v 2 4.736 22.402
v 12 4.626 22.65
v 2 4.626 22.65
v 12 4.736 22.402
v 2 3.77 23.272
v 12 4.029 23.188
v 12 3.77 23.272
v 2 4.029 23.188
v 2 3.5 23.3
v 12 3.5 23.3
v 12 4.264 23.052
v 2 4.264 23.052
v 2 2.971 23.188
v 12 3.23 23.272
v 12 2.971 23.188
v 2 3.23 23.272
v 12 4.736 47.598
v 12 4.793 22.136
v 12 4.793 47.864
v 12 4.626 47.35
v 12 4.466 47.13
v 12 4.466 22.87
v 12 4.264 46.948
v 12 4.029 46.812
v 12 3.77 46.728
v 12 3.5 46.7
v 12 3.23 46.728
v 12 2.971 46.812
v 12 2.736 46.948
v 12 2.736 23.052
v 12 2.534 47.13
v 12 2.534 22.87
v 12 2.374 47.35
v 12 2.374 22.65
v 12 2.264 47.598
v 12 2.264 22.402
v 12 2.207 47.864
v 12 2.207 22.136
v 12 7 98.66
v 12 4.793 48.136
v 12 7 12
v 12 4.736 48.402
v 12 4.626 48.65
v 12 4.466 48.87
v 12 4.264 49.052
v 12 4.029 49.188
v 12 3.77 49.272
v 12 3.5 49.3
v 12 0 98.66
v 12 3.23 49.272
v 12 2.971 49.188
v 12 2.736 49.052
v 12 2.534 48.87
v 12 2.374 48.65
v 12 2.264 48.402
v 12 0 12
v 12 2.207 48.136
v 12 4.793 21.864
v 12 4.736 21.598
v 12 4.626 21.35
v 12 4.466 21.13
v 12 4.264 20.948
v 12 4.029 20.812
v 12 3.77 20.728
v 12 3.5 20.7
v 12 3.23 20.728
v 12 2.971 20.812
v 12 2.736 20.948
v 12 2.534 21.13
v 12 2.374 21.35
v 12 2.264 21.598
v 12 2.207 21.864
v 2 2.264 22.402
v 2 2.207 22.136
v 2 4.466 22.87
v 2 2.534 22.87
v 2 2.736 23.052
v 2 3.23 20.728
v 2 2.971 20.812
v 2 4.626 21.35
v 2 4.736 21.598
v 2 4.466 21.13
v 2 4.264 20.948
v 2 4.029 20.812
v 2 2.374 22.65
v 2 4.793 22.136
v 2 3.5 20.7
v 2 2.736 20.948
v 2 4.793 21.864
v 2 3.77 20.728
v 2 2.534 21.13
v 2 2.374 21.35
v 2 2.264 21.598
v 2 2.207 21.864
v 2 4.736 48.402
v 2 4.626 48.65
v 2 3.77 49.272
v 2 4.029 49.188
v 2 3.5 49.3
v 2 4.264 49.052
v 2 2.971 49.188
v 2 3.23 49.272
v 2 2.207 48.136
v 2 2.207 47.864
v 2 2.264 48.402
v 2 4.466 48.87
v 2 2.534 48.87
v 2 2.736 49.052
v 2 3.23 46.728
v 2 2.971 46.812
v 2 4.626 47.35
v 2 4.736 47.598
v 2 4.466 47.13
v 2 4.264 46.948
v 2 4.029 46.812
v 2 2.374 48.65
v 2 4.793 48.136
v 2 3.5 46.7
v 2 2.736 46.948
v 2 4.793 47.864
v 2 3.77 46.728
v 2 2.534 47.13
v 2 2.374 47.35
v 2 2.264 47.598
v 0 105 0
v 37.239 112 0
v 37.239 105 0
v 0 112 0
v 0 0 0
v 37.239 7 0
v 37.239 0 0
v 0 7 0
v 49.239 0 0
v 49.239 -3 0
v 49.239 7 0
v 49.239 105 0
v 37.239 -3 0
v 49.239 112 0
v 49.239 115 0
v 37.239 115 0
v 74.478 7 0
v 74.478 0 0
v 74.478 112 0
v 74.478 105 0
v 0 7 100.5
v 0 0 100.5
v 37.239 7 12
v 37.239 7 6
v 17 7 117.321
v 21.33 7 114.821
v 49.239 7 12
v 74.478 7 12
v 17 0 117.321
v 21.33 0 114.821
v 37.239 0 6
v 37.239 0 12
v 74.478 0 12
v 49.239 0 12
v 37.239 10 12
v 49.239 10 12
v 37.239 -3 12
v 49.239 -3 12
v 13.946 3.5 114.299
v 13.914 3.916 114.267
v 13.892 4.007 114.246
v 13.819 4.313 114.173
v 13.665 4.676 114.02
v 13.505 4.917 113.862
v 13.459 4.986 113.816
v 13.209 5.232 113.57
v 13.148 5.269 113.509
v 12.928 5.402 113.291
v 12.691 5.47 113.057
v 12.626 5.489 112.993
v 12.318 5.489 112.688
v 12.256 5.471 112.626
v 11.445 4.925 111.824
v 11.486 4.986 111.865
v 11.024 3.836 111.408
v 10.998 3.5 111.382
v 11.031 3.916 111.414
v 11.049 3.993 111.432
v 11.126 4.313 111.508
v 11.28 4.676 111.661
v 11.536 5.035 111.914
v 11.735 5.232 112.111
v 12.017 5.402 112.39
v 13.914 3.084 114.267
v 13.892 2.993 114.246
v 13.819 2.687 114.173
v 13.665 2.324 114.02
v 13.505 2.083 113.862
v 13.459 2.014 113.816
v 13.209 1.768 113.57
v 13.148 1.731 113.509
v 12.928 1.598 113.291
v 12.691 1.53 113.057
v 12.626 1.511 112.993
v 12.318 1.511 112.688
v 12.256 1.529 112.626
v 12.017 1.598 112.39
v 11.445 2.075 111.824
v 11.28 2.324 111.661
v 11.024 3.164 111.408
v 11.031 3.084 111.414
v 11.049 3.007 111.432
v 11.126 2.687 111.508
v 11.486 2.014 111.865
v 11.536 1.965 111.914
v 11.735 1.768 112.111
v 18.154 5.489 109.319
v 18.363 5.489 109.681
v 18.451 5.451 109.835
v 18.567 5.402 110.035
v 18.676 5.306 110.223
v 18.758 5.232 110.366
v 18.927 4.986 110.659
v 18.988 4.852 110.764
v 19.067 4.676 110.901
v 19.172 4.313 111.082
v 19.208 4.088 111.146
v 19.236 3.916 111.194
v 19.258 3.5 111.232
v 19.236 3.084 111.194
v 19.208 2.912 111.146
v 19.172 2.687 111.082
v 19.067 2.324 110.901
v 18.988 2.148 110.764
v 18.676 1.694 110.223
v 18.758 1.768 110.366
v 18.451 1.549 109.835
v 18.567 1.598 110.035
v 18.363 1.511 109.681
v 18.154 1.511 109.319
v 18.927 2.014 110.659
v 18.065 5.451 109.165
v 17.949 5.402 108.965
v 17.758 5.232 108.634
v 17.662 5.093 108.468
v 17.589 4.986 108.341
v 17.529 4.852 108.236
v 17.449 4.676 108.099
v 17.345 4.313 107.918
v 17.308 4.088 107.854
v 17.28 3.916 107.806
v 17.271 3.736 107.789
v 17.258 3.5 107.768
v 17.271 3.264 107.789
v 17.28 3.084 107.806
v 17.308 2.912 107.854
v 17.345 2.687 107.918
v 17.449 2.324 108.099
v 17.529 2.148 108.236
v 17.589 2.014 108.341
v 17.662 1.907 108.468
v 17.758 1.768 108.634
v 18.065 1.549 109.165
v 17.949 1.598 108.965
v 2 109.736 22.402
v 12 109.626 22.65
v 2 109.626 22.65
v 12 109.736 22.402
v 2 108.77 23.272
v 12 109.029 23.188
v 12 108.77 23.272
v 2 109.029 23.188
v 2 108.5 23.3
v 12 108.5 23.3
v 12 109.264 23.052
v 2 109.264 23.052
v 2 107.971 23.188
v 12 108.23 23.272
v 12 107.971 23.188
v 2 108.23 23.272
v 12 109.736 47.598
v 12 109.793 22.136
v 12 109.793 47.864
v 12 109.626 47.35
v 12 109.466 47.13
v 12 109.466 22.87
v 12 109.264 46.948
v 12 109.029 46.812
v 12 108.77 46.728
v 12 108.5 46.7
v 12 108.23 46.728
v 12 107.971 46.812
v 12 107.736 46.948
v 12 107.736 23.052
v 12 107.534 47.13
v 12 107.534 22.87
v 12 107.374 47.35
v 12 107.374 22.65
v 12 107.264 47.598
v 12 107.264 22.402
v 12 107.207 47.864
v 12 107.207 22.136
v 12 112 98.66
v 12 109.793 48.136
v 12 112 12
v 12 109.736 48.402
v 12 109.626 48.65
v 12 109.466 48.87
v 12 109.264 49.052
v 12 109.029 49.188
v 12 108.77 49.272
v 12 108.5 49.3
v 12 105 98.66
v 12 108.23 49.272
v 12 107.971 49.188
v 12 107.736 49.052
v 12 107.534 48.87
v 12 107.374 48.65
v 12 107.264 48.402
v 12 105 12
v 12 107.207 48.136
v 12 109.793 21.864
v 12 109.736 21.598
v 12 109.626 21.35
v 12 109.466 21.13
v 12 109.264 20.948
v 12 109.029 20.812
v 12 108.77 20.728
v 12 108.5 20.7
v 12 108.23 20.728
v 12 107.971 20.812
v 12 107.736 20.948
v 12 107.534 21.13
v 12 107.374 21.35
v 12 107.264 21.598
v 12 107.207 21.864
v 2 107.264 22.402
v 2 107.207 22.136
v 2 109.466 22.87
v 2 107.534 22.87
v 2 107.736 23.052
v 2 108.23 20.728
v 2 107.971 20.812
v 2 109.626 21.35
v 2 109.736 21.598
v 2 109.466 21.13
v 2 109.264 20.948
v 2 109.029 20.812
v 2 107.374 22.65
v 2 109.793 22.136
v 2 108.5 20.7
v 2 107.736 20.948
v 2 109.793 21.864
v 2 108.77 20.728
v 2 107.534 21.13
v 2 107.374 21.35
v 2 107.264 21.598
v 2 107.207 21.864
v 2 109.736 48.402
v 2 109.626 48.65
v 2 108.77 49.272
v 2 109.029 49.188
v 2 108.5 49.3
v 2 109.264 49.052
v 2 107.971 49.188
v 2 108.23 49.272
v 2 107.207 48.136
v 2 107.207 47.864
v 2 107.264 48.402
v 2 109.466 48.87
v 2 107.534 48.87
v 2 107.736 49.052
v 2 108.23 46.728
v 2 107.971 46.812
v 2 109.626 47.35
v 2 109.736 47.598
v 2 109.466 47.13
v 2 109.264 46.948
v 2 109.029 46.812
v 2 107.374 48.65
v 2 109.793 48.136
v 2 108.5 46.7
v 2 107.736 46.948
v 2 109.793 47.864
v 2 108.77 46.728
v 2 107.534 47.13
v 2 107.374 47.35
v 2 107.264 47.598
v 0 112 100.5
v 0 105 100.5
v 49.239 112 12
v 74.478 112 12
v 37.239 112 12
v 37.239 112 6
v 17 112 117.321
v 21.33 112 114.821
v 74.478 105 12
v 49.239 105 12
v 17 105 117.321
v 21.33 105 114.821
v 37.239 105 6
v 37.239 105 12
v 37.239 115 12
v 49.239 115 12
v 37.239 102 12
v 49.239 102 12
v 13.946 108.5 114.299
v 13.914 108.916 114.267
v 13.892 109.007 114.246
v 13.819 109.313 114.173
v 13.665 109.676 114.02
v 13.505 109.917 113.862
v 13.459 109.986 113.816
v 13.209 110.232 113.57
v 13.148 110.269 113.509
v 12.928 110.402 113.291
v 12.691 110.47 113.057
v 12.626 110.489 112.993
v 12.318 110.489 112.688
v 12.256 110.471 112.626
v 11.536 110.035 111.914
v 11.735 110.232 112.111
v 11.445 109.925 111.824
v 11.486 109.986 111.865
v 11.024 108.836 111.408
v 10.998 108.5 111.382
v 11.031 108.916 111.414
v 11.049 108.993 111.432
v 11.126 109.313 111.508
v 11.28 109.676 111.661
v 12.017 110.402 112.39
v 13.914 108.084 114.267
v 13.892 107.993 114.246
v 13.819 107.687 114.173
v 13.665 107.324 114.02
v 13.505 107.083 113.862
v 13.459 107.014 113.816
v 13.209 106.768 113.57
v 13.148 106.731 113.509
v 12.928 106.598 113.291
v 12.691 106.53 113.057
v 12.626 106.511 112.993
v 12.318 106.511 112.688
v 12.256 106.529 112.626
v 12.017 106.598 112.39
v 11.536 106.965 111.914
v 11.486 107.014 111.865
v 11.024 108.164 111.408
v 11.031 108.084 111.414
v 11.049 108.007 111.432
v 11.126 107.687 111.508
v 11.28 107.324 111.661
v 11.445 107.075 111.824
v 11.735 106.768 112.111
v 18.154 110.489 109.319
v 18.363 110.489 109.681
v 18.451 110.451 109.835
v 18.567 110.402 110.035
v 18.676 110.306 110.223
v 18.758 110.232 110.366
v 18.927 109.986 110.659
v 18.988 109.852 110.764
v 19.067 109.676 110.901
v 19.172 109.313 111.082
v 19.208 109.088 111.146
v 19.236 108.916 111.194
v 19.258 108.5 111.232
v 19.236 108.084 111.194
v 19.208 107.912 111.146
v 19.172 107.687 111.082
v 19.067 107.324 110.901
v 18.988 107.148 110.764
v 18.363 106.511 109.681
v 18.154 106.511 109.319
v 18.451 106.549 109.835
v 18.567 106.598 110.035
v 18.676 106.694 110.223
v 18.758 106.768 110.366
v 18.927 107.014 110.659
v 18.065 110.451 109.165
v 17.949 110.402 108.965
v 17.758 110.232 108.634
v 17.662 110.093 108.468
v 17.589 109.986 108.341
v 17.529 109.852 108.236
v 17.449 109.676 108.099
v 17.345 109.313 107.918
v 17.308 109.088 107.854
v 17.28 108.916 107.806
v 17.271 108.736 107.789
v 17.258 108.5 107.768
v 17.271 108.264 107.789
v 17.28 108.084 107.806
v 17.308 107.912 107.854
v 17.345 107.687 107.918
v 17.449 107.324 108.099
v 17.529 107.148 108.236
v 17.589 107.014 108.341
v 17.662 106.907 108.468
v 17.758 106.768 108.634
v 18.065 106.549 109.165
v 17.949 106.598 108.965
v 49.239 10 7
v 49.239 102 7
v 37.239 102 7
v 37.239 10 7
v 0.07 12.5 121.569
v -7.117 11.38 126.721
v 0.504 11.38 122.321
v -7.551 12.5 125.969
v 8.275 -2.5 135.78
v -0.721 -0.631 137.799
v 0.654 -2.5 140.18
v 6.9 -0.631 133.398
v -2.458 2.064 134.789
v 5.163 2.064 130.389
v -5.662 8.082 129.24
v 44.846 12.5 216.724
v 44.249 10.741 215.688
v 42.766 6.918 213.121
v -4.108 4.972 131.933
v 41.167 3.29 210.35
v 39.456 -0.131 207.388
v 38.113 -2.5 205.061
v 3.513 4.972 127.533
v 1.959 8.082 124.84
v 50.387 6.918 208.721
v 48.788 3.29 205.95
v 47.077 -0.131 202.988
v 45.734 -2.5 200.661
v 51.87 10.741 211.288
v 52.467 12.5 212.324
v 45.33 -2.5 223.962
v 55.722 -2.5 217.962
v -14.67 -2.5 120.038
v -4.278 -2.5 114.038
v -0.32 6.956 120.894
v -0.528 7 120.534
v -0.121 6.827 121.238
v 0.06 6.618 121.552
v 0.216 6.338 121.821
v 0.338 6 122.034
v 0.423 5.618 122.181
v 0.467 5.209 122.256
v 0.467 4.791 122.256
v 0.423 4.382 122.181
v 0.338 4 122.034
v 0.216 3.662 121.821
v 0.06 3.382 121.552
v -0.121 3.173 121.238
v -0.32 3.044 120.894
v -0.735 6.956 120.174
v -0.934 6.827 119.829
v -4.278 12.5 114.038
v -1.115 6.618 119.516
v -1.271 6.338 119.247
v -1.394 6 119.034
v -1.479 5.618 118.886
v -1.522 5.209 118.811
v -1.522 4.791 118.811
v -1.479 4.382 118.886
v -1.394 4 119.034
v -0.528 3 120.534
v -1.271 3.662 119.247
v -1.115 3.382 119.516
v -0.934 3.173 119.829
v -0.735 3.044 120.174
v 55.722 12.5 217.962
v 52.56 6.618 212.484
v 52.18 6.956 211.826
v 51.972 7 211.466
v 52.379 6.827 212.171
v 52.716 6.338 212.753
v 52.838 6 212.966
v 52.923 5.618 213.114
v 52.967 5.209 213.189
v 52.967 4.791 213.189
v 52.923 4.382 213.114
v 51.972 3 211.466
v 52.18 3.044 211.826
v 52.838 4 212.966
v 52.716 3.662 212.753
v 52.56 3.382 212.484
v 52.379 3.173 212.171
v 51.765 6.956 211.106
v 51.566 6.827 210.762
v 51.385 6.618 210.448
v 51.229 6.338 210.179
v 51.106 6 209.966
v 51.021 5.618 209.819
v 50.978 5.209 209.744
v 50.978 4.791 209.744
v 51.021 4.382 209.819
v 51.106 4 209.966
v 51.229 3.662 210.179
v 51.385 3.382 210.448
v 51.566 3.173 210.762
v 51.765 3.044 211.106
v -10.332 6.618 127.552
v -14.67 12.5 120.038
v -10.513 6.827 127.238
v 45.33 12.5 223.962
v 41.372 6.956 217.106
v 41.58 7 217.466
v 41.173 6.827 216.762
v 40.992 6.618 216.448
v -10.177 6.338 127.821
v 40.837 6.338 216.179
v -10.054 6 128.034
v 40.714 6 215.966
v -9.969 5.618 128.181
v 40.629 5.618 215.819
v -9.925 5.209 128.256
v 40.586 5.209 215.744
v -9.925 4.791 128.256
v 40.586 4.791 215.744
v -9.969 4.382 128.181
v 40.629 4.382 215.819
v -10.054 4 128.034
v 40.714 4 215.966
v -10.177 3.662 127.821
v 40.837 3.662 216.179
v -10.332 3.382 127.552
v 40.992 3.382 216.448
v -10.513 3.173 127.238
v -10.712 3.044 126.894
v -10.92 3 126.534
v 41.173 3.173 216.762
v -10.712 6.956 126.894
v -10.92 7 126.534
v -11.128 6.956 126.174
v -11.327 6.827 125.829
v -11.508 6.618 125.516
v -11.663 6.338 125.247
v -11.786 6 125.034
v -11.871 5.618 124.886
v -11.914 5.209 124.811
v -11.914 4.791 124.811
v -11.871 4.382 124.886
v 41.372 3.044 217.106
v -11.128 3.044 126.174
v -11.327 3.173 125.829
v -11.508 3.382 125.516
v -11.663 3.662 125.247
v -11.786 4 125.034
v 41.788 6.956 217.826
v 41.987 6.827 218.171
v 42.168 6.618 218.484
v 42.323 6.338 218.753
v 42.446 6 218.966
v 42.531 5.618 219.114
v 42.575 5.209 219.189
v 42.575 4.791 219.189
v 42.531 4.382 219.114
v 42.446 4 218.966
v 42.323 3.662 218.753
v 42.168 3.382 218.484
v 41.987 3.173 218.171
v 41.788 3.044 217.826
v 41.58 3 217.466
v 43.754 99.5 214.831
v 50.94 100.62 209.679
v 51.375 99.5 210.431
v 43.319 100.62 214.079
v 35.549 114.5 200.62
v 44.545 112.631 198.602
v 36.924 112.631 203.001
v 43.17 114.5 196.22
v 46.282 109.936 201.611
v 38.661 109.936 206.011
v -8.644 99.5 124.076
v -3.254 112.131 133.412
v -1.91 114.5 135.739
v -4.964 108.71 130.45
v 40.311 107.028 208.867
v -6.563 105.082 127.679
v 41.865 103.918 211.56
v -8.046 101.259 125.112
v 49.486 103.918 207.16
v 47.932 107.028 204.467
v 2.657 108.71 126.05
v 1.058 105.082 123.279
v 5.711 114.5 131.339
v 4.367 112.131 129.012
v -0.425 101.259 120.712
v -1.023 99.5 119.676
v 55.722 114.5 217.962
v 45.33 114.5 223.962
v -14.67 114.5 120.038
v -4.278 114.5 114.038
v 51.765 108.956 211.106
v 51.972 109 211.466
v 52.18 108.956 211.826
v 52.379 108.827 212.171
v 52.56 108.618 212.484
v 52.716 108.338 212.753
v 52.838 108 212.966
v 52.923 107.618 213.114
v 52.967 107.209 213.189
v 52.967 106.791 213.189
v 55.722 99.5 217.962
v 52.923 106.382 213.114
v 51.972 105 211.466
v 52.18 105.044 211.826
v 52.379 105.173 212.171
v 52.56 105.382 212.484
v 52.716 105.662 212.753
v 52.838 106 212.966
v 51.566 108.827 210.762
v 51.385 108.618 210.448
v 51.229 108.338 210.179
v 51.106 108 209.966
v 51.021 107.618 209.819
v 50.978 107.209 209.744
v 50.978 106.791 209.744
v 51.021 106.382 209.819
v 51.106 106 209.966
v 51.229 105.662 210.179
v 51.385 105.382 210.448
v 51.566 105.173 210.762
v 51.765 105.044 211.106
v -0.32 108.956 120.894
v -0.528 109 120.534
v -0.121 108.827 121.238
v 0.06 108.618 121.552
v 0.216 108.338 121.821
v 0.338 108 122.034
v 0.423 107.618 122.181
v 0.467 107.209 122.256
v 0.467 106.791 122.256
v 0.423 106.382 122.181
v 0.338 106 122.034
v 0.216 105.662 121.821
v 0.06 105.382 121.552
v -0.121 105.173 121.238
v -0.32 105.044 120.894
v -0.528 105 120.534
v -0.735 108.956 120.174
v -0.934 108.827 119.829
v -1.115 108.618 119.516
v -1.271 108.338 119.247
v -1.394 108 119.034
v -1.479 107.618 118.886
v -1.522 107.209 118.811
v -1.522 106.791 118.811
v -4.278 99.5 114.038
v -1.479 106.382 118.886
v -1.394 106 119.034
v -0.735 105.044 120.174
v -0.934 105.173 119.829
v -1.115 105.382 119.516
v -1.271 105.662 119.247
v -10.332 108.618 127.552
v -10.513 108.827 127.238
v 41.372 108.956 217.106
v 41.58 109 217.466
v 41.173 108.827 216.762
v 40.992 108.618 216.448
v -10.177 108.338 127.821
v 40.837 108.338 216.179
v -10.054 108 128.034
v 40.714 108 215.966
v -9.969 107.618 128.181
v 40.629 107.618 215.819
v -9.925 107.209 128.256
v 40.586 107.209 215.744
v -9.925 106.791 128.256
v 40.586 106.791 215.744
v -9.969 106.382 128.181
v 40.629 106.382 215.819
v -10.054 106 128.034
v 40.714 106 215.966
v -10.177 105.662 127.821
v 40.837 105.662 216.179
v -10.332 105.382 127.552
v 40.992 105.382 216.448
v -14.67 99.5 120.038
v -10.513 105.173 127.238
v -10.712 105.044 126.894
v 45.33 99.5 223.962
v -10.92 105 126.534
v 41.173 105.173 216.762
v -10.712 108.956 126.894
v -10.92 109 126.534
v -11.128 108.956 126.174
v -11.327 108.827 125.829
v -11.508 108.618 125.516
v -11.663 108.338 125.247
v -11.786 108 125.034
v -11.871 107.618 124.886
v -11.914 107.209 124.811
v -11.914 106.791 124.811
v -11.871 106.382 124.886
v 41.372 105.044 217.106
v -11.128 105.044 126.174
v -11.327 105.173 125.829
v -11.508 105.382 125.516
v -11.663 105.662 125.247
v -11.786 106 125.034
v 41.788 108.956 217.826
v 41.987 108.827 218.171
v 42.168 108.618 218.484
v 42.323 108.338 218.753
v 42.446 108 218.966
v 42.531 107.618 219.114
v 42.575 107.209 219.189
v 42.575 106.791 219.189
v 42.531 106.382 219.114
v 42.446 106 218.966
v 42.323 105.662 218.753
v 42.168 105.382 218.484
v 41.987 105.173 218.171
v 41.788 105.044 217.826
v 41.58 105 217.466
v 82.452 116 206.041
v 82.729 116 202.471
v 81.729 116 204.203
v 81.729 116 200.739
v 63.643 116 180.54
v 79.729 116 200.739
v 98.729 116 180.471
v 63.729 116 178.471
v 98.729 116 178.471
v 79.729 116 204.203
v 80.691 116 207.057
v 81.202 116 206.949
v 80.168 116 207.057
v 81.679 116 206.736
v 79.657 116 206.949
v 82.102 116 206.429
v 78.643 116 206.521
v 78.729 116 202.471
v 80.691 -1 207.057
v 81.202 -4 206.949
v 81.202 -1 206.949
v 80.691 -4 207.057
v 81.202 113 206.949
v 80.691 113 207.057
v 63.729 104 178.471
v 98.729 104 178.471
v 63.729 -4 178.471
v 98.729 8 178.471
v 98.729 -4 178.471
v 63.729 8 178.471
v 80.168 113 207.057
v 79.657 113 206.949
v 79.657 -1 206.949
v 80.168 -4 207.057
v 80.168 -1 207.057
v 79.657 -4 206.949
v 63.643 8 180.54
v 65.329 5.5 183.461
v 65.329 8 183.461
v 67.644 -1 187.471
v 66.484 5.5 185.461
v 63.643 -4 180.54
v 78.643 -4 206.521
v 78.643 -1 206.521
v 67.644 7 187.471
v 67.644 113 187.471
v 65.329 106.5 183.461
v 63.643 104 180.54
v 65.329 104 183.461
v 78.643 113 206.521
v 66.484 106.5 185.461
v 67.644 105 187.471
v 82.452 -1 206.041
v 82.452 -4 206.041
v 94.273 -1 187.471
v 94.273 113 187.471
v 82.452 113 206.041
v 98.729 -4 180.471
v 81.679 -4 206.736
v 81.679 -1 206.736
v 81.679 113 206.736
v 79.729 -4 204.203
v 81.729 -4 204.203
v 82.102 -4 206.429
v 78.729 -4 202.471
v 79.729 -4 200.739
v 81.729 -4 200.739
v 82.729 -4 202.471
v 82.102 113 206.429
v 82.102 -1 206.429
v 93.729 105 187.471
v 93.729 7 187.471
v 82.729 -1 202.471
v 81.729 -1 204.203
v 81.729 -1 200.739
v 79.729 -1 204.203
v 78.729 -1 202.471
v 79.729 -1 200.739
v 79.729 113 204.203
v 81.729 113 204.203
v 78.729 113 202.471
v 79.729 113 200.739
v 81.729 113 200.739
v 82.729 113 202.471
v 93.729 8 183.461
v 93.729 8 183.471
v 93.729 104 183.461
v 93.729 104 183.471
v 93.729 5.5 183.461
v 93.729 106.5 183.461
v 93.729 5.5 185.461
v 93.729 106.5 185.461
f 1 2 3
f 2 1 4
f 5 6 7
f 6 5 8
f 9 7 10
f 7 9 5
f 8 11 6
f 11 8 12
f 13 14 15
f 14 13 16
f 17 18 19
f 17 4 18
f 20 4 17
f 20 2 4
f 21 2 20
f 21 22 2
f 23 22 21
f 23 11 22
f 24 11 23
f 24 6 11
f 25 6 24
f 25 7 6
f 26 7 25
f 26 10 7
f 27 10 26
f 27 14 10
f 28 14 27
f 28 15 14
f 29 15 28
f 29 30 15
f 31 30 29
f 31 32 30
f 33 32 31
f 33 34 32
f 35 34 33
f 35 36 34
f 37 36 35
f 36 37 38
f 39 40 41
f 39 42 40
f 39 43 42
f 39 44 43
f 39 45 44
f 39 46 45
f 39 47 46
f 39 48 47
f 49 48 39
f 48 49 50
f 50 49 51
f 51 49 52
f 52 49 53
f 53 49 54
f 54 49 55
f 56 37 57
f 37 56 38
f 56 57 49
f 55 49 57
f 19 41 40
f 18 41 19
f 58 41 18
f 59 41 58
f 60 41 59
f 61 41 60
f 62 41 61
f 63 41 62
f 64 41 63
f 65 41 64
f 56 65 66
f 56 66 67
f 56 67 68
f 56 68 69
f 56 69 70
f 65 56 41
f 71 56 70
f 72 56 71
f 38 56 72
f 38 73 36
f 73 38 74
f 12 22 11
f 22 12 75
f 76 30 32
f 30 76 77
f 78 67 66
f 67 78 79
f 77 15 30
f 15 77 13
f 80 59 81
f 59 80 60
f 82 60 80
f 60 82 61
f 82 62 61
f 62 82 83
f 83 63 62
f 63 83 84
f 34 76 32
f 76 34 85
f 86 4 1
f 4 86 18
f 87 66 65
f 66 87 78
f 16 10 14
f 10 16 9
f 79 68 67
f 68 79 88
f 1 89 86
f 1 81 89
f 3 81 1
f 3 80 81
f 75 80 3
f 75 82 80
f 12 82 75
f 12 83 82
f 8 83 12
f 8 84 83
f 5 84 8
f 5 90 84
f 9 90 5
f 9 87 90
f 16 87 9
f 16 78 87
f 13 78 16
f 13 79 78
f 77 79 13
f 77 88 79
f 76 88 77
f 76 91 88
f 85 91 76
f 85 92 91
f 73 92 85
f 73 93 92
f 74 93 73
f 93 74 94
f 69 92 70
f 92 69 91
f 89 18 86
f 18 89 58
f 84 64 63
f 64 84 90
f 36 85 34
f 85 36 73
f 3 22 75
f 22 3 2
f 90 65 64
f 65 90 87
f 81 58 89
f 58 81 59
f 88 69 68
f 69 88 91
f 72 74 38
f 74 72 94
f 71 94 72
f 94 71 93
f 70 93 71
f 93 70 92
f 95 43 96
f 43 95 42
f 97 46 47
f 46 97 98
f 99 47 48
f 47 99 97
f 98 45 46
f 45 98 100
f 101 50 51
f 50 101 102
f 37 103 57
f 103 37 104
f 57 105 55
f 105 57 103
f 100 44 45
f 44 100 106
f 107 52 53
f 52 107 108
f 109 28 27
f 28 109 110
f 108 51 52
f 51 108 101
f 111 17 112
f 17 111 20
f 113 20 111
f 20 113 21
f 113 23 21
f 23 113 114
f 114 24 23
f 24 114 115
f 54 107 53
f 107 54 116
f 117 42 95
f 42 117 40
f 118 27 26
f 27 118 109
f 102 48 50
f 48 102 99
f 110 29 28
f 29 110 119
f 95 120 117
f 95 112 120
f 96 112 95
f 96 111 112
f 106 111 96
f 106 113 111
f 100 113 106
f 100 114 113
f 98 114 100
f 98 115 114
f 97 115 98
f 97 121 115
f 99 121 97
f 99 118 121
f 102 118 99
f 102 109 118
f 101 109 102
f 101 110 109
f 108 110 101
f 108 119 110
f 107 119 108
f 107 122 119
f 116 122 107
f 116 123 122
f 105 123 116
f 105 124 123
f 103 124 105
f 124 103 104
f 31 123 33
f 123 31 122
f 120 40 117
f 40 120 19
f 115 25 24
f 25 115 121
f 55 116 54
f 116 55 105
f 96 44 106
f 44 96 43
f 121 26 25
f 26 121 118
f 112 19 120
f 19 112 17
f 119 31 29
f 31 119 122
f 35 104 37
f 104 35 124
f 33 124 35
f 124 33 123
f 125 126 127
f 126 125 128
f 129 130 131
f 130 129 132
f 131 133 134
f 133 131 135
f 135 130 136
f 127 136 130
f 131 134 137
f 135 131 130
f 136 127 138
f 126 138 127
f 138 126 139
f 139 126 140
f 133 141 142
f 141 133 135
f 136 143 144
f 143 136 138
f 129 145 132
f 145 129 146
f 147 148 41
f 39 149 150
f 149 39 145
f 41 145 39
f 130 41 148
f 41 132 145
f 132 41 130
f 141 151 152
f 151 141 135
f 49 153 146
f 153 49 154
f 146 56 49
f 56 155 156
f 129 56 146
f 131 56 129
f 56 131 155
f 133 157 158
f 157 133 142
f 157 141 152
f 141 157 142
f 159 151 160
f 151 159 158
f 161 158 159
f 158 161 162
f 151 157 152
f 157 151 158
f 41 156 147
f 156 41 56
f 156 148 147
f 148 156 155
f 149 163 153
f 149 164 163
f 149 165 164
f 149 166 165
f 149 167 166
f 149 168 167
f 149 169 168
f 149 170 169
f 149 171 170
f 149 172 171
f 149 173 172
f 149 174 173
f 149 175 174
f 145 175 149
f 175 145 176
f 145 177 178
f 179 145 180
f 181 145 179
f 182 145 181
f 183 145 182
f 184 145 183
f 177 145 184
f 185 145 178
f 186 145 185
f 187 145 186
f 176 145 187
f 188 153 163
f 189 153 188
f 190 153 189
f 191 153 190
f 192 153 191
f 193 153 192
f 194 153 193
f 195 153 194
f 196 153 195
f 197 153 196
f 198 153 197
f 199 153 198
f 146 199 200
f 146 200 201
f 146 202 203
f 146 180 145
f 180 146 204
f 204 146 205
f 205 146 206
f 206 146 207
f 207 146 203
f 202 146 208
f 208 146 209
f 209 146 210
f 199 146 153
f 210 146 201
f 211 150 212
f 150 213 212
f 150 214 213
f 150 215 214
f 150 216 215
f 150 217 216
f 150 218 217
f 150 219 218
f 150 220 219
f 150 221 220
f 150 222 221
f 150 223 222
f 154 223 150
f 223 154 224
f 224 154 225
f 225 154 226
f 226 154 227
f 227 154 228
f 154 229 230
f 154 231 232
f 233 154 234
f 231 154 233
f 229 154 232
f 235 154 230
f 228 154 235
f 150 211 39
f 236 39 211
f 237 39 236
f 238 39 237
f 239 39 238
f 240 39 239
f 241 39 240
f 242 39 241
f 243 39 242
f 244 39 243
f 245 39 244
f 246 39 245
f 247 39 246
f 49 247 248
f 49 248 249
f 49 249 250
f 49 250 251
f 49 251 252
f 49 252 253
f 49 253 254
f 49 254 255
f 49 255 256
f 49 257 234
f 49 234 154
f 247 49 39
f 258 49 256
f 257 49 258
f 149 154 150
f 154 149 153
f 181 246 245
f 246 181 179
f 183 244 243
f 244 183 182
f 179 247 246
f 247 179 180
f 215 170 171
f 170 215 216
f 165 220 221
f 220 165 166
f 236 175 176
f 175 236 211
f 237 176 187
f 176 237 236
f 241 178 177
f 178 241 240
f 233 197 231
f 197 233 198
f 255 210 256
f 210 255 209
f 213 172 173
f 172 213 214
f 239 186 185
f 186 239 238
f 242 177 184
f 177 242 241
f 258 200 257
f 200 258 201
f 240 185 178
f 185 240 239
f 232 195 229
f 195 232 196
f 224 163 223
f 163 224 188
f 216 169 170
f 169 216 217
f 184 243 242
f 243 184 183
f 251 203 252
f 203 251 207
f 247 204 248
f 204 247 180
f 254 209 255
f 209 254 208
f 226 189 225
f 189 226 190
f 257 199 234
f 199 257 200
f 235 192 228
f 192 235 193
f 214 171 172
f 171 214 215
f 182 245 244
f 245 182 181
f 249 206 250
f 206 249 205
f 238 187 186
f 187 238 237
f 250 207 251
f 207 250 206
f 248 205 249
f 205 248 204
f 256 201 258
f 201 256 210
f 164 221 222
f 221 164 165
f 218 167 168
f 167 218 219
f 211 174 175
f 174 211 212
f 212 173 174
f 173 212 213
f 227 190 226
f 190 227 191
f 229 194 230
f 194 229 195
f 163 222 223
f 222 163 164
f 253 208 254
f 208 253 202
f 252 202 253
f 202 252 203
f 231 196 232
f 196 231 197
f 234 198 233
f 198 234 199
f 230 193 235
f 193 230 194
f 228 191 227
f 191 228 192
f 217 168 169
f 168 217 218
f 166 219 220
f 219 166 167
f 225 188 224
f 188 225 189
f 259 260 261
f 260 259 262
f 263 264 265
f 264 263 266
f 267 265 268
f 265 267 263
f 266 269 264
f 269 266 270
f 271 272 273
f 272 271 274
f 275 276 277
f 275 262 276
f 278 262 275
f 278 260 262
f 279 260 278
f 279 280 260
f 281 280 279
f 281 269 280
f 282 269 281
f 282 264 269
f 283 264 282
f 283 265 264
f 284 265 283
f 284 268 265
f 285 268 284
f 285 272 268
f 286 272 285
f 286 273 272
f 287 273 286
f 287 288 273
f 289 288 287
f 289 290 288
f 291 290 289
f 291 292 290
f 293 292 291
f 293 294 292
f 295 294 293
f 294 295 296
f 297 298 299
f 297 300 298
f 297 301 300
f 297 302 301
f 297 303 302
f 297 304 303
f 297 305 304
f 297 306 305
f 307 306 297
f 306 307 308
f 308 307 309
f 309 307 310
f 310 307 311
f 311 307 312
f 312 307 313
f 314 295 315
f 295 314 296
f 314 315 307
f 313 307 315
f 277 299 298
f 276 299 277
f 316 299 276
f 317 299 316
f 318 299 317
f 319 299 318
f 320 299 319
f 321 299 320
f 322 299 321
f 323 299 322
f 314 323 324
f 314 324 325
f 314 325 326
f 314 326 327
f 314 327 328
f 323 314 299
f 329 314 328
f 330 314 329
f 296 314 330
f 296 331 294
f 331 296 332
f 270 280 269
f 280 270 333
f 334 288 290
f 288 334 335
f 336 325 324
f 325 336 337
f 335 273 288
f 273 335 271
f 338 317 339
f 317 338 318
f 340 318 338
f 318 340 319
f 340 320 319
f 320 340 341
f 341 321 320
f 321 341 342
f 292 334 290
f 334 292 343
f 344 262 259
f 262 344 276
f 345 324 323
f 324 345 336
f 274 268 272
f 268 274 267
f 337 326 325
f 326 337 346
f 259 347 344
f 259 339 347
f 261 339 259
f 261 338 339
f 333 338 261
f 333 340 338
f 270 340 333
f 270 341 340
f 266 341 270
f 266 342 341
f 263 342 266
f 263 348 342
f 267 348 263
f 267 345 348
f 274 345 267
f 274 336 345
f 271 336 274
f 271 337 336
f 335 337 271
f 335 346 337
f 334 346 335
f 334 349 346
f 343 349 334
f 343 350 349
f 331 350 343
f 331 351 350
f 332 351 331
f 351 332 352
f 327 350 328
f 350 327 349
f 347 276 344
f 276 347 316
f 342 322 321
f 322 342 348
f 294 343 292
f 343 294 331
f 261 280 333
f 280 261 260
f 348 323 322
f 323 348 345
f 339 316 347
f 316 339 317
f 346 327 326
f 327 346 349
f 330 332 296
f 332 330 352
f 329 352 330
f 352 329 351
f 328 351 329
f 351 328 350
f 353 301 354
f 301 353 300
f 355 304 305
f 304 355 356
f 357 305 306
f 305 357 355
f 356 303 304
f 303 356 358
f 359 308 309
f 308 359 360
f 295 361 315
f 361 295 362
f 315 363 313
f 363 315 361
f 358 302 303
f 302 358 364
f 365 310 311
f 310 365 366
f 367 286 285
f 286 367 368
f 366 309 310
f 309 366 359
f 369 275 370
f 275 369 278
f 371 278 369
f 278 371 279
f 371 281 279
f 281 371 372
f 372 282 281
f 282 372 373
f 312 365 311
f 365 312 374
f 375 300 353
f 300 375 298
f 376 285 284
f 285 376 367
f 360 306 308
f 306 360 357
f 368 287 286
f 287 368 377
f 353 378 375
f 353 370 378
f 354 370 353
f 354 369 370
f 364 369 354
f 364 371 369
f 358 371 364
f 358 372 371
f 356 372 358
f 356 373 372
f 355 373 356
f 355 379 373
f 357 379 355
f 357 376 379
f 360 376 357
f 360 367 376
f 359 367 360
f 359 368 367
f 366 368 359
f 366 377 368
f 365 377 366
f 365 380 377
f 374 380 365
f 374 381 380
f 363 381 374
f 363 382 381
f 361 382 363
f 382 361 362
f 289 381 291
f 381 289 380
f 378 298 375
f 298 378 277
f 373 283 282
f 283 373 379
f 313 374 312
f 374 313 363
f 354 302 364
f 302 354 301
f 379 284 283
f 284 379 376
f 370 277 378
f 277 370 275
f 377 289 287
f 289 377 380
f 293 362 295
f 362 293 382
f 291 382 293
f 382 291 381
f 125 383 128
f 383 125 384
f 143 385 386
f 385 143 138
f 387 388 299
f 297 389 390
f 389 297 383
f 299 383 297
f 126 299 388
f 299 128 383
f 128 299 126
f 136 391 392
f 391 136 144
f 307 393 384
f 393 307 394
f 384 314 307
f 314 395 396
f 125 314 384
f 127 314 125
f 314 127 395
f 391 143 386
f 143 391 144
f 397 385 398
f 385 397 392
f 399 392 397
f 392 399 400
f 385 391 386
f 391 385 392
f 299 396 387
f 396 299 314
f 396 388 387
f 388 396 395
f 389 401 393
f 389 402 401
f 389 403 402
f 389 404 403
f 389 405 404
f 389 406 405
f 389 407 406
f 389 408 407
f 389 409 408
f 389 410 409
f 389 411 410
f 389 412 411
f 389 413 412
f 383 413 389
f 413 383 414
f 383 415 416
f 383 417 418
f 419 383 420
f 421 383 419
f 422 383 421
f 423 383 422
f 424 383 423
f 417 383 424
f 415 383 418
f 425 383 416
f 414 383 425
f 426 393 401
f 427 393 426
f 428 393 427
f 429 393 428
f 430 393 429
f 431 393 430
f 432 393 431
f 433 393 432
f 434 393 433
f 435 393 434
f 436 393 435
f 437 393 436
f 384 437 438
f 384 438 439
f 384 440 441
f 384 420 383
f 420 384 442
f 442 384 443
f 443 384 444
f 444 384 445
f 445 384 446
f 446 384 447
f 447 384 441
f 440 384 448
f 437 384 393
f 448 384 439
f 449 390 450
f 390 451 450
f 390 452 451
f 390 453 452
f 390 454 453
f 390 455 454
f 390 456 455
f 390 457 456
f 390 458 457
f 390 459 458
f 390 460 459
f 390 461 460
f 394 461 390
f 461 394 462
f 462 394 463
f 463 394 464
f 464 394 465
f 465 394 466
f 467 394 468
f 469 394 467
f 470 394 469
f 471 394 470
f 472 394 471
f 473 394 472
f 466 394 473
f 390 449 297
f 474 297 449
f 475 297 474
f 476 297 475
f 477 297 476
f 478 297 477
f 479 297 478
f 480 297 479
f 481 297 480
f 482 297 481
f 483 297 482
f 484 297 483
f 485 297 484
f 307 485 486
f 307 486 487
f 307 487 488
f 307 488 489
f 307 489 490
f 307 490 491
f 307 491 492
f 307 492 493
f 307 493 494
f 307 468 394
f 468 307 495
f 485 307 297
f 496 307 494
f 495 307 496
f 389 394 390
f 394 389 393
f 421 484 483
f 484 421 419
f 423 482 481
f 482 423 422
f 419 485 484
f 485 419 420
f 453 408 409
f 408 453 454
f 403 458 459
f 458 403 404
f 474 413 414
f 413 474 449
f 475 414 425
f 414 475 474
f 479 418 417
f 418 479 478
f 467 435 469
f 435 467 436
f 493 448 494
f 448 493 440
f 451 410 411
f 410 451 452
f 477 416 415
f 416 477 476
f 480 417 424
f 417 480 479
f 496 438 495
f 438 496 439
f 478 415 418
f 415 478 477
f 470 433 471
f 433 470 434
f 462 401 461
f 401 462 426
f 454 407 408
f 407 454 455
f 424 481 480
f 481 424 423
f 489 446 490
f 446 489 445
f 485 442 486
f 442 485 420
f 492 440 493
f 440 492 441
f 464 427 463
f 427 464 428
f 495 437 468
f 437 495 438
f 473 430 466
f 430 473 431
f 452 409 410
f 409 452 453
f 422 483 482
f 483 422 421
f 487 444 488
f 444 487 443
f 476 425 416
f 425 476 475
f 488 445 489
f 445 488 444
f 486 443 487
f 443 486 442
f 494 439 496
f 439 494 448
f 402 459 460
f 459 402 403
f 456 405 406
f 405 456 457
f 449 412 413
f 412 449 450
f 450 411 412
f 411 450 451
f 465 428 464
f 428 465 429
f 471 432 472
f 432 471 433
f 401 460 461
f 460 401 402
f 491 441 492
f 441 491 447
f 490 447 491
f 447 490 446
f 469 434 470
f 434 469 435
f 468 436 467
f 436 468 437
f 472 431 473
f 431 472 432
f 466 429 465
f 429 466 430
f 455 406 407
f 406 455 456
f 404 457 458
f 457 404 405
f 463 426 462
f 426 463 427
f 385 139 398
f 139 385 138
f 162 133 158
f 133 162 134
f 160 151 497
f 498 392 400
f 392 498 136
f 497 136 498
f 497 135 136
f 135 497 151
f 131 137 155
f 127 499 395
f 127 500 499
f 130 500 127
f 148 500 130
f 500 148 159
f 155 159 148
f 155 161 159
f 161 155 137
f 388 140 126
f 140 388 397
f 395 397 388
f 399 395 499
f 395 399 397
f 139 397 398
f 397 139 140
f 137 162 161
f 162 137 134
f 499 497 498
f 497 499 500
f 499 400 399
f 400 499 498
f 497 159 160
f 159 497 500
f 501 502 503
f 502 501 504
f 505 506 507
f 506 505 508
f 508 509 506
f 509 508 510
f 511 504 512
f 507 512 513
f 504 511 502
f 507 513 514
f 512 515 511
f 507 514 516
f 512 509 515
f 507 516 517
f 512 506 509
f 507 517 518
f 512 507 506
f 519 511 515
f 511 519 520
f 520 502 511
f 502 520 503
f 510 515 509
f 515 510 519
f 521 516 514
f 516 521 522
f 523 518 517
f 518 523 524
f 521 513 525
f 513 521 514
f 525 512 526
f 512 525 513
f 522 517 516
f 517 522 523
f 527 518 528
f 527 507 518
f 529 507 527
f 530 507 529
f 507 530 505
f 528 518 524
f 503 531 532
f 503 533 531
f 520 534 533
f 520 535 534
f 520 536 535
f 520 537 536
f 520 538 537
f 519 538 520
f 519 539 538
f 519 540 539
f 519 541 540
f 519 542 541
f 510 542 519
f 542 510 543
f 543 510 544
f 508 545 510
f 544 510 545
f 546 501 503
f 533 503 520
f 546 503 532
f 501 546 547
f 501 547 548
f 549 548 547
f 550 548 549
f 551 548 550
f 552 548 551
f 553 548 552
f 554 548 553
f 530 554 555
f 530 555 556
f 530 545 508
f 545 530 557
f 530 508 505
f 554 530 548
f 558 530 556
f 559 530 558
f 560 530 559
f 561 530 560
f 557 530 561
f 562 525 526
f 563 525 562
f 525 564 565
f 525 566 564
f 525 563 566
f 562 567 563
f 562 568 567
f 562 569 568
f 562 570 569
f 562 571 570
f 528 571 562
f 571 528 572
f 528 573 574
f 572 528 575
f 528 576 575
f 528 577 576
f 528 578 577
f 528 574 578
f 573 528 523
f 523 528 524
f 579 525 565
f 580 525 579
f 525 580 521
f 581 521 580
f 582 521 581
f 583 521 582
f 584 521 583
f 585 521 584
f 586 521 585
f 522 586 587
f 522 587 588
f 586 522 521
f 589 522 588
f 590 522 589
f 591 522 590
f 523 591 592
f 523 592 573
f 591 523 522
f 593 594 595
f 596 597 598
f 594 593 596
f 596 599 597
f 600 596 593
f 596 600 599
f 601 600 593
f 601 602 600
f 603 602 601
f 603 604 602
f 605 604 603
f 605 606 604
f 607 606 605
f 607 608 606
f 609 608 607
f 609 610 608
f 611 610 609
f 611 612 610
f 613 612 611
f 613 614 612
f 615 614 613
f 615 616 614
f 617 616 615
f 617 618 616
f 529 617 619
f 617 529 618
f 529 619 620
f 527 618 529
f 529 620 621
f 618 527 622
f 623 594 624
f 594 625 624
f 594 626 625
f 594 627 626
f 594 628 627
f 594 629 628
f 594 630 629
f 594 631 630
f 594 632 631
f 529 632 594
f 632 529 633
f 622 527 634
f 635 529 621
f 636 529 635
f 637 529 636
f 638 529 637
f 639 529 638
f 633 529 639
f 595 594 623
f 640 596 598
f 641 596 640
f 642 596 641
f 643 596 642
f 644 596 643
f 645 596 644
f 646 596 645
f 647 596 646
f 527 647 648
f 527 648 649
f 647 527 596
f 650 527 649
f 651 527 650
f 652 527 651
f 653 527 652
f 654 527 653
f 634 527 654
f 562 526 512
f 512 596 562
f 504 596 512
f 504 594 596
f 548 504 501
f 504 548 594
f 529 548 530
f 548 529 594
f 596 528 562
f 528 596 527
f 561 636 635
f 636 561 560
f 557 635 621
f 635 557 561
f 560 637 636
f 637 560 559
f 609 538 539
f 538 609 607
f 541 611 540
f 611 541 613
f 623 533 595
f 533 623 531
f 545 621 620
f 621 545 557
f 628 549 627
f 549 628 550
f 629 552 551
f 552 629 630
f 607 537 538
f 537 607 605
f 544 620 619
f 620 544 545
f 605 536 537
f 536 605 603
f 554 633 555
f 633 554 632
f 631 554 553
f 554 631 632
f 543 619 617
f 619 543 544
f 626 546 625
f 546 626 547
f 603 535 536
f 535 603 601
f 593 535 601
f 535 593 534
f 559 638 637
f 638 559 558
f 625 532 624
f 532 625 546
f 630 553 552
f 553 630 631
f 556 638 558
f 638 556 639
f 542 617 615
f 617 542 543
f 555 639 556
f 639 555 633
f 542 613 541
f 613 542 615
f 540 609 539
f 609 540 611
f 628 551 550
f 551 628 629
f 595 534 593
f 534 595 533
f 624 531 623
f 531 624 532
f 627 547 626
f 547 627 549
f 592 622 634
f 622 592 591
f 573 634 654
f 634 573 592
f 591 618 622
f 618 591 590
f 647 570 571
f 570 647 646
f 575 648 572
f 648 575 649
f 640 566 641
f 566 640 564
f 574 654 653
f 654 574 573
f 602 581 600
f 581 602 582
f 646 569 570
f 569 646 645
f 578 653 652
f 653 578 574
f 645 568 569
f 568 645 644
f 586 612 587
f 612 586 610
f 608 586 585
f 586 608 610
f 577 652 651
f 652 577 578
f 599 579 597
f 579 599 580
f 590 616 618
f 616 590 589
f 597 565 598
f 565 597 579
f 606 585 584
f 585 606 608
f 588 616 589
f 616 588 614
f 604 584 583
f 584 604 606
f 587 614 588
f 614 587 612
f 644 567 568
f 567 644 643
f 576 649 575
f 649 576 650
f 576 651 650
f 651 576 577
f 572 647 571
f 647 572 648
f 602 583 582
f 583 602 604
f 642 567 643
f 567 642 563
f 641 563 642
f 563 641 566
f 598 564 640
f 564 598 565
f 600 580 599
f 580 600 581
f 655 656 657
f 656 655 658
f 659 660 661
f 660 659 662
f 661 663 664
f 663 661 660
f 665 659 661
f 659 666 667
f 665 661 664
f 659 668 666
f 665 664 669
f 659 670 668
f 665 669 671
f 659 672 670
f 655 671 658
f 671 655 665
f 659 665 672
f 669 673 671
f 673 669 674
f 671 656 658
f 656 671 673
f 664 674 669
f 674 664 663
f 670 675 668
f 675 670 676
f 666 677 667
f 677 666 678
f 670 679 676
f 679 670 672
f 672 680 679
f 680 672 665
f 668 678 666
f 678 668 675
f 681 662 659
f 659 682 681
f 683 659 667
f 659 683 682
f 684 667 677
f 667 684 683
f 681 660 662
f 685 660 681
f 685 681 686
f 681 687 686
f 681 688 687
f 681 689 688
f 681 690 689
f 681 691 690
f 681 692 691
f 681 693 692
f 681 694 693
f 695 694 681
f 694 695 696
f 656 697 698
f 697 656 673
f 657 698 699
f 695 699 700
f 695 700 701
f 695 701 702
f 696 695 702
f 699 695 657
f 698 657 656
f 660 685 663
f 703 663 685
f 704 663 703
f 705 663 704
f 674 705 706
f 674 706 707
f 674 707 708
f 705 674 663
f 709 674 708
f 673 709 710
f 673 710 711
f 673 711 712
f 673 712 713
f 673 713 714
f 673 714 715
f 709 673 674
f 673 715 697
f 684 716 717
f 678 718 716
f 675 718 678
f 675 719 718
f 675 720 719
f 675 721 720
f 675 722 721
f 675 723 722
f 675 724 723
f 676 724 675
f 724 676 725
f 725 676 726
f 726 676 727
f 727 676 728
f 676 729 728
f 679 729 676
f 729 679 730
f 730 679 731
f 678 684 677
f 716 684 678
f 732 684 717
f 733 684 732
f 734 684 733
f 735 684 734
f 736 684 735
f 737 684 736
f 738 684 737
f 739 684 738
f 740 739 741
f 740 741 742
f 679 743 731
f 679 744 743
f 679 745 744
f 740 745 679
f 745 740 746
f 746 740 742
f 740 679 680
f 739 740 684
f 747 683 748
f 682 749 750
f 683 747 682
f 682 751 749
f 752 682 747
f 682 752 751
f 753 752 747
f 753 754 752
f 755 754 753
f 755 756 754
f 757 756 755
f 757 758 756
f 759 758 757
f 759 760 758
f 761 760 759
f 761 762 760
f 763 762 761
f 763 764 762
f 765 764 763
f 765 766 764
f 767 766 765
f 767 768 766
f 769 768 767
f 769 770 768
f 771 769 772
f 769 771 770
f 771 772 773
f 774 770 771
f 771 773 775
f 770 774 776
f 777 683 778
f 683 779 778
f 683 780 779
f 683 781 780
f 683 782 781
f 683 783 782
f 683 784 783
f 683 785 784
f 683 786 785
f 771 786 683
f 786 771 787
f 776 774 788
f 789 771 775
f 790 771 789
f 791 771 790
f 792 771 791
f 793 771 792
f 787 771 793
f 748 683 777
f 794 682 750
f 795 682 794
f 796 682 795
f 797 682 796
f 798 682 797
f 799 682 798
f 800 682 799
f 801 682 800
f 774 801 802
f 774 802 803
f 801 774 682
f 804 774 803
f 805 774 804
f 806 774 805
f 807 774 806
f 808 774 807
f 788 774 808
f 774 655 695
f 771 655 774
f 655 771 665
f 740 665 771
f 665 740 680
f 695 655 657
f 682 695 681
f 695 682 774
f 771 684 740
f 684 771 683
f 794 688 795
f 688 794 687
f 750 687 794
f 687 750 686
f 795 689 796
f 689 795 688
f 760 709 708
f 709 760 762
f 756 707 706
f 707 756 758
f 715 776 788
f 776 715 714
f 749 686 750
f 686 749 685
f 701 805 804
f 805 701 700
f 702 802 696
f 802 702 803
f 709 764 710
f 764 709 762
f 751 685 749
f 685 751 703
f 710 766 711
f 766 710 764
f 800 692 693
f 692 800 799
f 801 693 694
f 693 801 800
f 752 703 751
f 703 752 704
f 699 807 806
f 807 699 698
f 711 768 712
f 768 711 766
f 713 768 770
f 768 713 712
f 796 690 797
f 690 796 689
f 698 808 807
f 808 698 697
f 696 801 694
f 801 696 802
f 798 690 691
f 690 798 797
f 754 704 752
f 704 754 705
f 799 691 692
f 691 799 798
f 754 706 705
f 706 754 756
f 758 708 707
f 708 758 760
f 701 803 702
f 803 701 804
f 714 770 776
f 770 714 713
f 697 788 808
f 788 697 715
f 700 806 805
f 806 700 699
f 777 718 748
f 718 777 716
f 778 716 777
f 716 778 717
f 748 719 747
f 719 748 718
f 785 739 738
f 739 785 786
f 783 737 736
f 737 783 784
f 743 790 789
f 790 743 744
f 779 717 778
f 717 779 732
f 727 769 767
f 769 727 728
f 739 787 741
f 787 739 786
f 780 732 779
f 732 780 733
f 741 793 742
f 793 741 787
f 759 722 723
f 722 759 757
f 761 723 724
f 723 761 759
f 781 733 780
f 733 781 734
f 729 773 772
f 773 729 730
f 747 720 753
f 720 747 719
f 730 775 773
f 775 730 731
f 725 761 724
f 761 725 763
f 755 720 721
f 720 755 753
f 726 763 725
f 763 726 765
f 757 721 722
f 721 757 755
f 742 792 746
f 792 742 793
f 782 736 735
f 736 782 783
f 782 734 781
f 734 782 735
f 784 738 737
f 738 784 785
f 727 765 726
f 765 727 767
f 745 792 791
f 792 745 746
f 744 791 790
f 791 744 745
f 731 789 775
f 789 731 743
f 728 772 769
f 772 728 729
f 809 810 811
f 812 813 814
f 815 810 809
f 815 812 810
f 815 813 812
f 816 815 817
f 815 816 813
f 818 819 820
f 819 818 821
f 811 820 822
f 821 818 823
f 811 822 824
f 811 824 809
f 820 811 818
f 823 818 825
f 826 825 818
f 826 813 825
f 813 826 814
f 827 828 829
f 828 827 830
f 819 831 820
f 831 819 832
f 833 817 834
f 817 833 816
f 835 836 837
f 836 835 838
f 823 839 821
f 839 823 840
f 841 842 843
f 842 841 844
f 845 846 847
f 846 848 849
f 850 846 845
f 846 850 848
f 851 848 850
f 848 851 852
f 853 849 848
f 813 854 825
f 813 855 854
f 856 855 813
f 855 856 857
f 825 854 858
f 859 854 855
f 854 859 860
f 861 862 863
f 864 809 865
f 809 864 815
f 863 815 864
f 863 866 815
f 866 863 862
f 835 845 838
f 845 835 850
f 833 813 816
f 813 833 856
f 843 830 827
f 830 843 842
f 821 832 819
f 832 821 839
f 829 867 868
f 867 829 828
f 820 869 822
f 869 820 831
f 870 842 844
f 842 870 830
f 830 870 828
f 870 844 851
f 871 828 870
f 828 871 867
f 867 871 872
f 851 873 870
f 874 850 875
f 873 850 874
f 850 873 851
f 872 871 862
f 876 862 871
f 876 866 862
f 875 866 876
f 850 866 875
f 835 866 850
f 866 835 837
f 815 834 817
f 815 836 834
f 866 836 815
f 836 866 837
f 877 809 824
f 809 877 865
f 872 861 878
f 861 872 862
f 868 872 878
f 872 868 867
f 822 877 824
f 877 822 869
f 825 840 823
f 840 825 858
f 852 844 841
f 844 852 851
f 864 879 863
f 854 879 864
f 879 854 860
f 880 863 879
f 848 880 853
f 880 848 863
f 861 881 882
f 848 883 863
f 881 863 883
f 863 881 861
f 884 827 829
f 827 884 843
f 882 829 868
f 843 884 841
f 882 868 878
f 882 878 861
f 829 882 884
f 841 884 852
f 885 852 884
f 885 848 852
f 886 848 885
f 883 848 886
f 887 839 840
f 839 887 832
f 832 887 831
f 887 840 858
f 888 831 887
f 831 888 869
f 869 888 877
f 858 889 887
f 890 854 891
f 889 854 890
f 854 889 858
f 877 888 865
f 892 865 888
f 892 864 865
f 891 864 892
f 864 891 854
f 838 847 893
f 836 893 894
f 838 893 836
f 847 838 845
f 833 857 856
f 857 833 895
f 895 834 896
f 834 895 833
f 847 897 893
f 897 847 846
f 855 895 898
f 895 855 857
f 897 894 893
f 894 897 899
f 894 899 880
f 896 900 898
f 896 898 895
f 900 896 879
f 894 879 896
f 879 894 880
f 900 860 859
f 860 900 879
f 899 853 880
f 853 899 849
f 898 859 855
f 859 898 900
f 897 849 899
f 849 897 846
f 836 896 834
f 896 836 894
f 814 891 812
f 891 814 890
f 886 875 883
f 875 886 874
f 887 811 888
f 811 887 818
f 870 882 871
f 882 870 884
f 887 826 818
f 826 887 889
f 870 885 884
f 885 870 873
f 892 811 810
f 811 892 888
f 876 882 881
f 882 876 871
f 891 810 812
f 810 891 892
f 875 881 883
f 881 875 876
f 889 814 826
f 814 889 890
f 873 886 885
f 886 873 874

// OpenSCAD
$fn=30;
fan_height = 109;
fan_angle = 30;
mount_length = 20;
foot_height = 100;

// Fan parameters
fan_plate_height = 4.2;
filter_width = 127;
fan_width = 120;
fanfilter_overlap = (filter_width - fan_width) / 2;
hole_diameter = 4;
hole_distance = 109 - hole_diameter;

// Modelling the original part

// front and back of the fan (used internally by module fan)
module fan_baseplate() {
	difference() {
		cube([fan_width, fan_width,fan_plate_height], center=true);
		for (i=[[1,1],[-1,1],[-1,-1],[1,-1]]) {
			translate([hole_distance/2*i[0], 
			           hole_distance/2*i[1], 0])
			cylinder(d=hole_diameter, h=fan_plate_height,center=true);
		}
	}
}

// the fan that should be positioned
// Any Standard 120mm fan will do
module fan() {
	translate([0,0,fan_plate_height/2])
	fan_baseplate();
	translate([0,0,(16.7)/2+fan_plate_height]){
		intersection() {
			cube([fan_width, fan_width,16.7 ], center=true);
			cylinder(d=119, h=16.7,center=true);
		}
	}
	translate([0,0,16.7 + fan_plate_height*1.5])
	fan_baseplate();
}

// Filter modell:  PKM CO2 Kassettenkohlefilter Umluftbetrieb Kohlefilter Aktivkohle
module approxfilter() {
	h=9.8;
	translate([0,0,-h]) {
		intersection(){
			overlap = 29;
			translate([0, 14.5,0])
			cube([127,62+overlap, h*2],center=true);
			translate([0,-3.5,0])
			cylinder(r=70, h=h, $fn=100);
		}
		translate([0,10,0])
		rotate([0,0,180])
		intersection() {
			overlap=33;
			translate([0,overlap,0])
			cube([127,20+overlap*2, h*2],center=true);
			cylinder(r=77, h=h, $fn=100);
		}
		translate([-67, 0, h/2])
		cube([9, 35, h], center=true);
		translate([67, 0, h/2])
		cube([9, 35, h], center=true);
	}
}

module lamp() {
	// PCB
	cube([20, 100, 2], center=true);
	// Cooler (measurements are estimated
	translate([0, 0, 27/2]) cube([10, 80, 25], center=true);
}



// Here begins the real design


// One of the foots where the fan is going to be connected to
module foot() {
	height = foot_height;
	thickness = [12, 7];
	regulator_hole_diameter = 2.6;
	mount_hole_diameter = 4;
	length = tan(fan_angle) * (fan_height + mount_length);

	difference() {
		cube([thickness[0], thickness[1], height]);
		rotate([0, -90, 0])
		translate([thickness[0] + 10,
		           thickness[1]/2,
		           -thickness[0]]) {
			cylinder(d=regulator_hole_diameter,
			         h=thickness[0]-2);
			translate ([26,0,0])
			cylinder(d=regulator_hole_diameter,
			         h=thickness[0]-2);
		}
	}

	difference() {
		cube([length, thickness[1], thickness[0]]);
		translate([length/2, -1, thickness[0]/2])

		// The Connector placeholder
		cube([thickness[0], thickness[1]+2, thickness[0]]);
	}

	difference() {
		hull() {
			translate([thickness[0]-5, 0, height]) {
				rotate([0, fan_angle, 0])
				cube([5, thickness[1], mount_length]);
			}
			translate([thickness[0]/2, thickness[1]/2, height]) {
				cube([thickness[0], thickness[1], 1], center=true);
			}
		}
		translate([thickness[0]-5, thickness[1]/2, height + mount_length-4]) {
			rotate([0, 90 + fan_angle, 0])
			cylinder(h=30, d=mount_hole_diameter, $fn=30);
		}
	}
}

module connector() {
	thickness = 12;
	overhang = 3;
	width = 98;
	foot_thickness = [12, 7];

	difference() {
		cube([thickness,
		      width + foot_thickness[1] * 2 + overhang * 2,
		      thickness]);

		translate([-1, overhang, -thickness/2])
		cube([thickness+2, foot_thickness[1], thickness]);

		translate([-1, 
		           overhang + foot_thickness [1]+ width, 
		           -thickness/2])
		cube([thickness+2, foot_thickness[1], thickness]);
		translate([0, overhang * 2 + foot_thickness[1], foot_thickness[1]])
		cube([thickness, width - overhang * 2, 10]);
	}
}

module clamp() {
	difference() {
		translate([fan_width/2-9, 0, -7])
		cube([15, fan_width , 12], center=true);

		fan();
		approxfilter();
		translate([fan_width/2-9, hole_distance/2, -5]) {
			cylinder(d=hole_diameter, h=30,center=true);
		}

		translate([fan_width/2-9, -hole_distance/2, -5]) {
			cylinder(d=hole_diameter, h=30,center=true);
		}
	}
}

module lamp_holder() {
	translate([0, -120/2, -3])
	difference () {
		hull() {
			translate([5, 0, 25]) {
			translate([-1.7, 60, -1.9]) rotate([90, 0, 0]) cylinder(d=5, h=120, center=true);
			rotate([0, 90-fan_angle, 0]) {
				cube([30, 120, 0.1]);
			}
			}
			translate([-15, 0, -3])
			cube([35, 120, 2]);
		}
		translate([-12, 3, 6]) cube([35, 120 - 6, 30]);

		translate([0, 12, -5]) cube([25, 96, 10]);

		// Rail
		translate([-10, 11, 1.99]) cube([35, 98, 30]);
		hull () {
			translate([-10, 9.5, 1.99]) cube([35, 101, 2]);
			translate([-10, 11, 4]) cube([35, 98, 2]);
		}

		// Light opening
		translate([-10, 12, 1.9]) hull () {
			cube([20, 96, 0.1]);
			translate([-5, 0, -5])
			cube([30, 96, 0.1]);
		}

		/* // Holes for wires
		translate([0, 7, -5]) {
			cylinder(d=3, h=20);
			translate([0, 5, 2])
			rotate([0, 45, 0])
			cube([5, 10, 5], center=true);
		}
		translate([0, 120 - 7, -5]) {
			cylinder(d=3, h=20);
			translate([0, -5, 2])
			rotate([0, 45, 0])
			cube([5, 10, 5], center=true);
		}
		*/

		// holes for zip ties to mount
		translate([3, 60, 21]) {
			rotate([90, 0, 0]) cylinder(d=4, h=200, center=true, $fn=6);
		}
	}
}

// The original part for reference
%translate([tan(fan_angle) * (fan_height + mount_length)/2 + 11,
            fan_width/2-4,
            foot_height + 120/2 - 7])
rotate([0, - 90 + fan_angle, 0]) {
	fan();
	translate([0, 0, 35]) approxfilter();
 }

// Print one of each

// The stand
translate([0, 0,   0]) foot();
translate([0, 105, 0]) foot();
translate([tan(fan_angle) * (fan_height + mount_length)/2, -3, 0]) connector();

// Everything here is relative to the fan position
translate([tan(fan_angle) * (fan_height + mount_length)/2 + 11,
           fan_width/2-4,
           foot_height + 120/2 - 7])
rotate([0, - 90 + fan_angle, 0]) {
	translate([0,0,25]) rotate([0, 180, 90]) clamp();
	translate([0,0,25]) rotate([0, 180, -90]) clamp();

	translate([120/2 - 15, 0, -15])
	rotate([0, 90 - fan_angle, 0]) 
		rotate([0, 0, 180]) {
		%lamp();
		lamp_holder();
	}
}
